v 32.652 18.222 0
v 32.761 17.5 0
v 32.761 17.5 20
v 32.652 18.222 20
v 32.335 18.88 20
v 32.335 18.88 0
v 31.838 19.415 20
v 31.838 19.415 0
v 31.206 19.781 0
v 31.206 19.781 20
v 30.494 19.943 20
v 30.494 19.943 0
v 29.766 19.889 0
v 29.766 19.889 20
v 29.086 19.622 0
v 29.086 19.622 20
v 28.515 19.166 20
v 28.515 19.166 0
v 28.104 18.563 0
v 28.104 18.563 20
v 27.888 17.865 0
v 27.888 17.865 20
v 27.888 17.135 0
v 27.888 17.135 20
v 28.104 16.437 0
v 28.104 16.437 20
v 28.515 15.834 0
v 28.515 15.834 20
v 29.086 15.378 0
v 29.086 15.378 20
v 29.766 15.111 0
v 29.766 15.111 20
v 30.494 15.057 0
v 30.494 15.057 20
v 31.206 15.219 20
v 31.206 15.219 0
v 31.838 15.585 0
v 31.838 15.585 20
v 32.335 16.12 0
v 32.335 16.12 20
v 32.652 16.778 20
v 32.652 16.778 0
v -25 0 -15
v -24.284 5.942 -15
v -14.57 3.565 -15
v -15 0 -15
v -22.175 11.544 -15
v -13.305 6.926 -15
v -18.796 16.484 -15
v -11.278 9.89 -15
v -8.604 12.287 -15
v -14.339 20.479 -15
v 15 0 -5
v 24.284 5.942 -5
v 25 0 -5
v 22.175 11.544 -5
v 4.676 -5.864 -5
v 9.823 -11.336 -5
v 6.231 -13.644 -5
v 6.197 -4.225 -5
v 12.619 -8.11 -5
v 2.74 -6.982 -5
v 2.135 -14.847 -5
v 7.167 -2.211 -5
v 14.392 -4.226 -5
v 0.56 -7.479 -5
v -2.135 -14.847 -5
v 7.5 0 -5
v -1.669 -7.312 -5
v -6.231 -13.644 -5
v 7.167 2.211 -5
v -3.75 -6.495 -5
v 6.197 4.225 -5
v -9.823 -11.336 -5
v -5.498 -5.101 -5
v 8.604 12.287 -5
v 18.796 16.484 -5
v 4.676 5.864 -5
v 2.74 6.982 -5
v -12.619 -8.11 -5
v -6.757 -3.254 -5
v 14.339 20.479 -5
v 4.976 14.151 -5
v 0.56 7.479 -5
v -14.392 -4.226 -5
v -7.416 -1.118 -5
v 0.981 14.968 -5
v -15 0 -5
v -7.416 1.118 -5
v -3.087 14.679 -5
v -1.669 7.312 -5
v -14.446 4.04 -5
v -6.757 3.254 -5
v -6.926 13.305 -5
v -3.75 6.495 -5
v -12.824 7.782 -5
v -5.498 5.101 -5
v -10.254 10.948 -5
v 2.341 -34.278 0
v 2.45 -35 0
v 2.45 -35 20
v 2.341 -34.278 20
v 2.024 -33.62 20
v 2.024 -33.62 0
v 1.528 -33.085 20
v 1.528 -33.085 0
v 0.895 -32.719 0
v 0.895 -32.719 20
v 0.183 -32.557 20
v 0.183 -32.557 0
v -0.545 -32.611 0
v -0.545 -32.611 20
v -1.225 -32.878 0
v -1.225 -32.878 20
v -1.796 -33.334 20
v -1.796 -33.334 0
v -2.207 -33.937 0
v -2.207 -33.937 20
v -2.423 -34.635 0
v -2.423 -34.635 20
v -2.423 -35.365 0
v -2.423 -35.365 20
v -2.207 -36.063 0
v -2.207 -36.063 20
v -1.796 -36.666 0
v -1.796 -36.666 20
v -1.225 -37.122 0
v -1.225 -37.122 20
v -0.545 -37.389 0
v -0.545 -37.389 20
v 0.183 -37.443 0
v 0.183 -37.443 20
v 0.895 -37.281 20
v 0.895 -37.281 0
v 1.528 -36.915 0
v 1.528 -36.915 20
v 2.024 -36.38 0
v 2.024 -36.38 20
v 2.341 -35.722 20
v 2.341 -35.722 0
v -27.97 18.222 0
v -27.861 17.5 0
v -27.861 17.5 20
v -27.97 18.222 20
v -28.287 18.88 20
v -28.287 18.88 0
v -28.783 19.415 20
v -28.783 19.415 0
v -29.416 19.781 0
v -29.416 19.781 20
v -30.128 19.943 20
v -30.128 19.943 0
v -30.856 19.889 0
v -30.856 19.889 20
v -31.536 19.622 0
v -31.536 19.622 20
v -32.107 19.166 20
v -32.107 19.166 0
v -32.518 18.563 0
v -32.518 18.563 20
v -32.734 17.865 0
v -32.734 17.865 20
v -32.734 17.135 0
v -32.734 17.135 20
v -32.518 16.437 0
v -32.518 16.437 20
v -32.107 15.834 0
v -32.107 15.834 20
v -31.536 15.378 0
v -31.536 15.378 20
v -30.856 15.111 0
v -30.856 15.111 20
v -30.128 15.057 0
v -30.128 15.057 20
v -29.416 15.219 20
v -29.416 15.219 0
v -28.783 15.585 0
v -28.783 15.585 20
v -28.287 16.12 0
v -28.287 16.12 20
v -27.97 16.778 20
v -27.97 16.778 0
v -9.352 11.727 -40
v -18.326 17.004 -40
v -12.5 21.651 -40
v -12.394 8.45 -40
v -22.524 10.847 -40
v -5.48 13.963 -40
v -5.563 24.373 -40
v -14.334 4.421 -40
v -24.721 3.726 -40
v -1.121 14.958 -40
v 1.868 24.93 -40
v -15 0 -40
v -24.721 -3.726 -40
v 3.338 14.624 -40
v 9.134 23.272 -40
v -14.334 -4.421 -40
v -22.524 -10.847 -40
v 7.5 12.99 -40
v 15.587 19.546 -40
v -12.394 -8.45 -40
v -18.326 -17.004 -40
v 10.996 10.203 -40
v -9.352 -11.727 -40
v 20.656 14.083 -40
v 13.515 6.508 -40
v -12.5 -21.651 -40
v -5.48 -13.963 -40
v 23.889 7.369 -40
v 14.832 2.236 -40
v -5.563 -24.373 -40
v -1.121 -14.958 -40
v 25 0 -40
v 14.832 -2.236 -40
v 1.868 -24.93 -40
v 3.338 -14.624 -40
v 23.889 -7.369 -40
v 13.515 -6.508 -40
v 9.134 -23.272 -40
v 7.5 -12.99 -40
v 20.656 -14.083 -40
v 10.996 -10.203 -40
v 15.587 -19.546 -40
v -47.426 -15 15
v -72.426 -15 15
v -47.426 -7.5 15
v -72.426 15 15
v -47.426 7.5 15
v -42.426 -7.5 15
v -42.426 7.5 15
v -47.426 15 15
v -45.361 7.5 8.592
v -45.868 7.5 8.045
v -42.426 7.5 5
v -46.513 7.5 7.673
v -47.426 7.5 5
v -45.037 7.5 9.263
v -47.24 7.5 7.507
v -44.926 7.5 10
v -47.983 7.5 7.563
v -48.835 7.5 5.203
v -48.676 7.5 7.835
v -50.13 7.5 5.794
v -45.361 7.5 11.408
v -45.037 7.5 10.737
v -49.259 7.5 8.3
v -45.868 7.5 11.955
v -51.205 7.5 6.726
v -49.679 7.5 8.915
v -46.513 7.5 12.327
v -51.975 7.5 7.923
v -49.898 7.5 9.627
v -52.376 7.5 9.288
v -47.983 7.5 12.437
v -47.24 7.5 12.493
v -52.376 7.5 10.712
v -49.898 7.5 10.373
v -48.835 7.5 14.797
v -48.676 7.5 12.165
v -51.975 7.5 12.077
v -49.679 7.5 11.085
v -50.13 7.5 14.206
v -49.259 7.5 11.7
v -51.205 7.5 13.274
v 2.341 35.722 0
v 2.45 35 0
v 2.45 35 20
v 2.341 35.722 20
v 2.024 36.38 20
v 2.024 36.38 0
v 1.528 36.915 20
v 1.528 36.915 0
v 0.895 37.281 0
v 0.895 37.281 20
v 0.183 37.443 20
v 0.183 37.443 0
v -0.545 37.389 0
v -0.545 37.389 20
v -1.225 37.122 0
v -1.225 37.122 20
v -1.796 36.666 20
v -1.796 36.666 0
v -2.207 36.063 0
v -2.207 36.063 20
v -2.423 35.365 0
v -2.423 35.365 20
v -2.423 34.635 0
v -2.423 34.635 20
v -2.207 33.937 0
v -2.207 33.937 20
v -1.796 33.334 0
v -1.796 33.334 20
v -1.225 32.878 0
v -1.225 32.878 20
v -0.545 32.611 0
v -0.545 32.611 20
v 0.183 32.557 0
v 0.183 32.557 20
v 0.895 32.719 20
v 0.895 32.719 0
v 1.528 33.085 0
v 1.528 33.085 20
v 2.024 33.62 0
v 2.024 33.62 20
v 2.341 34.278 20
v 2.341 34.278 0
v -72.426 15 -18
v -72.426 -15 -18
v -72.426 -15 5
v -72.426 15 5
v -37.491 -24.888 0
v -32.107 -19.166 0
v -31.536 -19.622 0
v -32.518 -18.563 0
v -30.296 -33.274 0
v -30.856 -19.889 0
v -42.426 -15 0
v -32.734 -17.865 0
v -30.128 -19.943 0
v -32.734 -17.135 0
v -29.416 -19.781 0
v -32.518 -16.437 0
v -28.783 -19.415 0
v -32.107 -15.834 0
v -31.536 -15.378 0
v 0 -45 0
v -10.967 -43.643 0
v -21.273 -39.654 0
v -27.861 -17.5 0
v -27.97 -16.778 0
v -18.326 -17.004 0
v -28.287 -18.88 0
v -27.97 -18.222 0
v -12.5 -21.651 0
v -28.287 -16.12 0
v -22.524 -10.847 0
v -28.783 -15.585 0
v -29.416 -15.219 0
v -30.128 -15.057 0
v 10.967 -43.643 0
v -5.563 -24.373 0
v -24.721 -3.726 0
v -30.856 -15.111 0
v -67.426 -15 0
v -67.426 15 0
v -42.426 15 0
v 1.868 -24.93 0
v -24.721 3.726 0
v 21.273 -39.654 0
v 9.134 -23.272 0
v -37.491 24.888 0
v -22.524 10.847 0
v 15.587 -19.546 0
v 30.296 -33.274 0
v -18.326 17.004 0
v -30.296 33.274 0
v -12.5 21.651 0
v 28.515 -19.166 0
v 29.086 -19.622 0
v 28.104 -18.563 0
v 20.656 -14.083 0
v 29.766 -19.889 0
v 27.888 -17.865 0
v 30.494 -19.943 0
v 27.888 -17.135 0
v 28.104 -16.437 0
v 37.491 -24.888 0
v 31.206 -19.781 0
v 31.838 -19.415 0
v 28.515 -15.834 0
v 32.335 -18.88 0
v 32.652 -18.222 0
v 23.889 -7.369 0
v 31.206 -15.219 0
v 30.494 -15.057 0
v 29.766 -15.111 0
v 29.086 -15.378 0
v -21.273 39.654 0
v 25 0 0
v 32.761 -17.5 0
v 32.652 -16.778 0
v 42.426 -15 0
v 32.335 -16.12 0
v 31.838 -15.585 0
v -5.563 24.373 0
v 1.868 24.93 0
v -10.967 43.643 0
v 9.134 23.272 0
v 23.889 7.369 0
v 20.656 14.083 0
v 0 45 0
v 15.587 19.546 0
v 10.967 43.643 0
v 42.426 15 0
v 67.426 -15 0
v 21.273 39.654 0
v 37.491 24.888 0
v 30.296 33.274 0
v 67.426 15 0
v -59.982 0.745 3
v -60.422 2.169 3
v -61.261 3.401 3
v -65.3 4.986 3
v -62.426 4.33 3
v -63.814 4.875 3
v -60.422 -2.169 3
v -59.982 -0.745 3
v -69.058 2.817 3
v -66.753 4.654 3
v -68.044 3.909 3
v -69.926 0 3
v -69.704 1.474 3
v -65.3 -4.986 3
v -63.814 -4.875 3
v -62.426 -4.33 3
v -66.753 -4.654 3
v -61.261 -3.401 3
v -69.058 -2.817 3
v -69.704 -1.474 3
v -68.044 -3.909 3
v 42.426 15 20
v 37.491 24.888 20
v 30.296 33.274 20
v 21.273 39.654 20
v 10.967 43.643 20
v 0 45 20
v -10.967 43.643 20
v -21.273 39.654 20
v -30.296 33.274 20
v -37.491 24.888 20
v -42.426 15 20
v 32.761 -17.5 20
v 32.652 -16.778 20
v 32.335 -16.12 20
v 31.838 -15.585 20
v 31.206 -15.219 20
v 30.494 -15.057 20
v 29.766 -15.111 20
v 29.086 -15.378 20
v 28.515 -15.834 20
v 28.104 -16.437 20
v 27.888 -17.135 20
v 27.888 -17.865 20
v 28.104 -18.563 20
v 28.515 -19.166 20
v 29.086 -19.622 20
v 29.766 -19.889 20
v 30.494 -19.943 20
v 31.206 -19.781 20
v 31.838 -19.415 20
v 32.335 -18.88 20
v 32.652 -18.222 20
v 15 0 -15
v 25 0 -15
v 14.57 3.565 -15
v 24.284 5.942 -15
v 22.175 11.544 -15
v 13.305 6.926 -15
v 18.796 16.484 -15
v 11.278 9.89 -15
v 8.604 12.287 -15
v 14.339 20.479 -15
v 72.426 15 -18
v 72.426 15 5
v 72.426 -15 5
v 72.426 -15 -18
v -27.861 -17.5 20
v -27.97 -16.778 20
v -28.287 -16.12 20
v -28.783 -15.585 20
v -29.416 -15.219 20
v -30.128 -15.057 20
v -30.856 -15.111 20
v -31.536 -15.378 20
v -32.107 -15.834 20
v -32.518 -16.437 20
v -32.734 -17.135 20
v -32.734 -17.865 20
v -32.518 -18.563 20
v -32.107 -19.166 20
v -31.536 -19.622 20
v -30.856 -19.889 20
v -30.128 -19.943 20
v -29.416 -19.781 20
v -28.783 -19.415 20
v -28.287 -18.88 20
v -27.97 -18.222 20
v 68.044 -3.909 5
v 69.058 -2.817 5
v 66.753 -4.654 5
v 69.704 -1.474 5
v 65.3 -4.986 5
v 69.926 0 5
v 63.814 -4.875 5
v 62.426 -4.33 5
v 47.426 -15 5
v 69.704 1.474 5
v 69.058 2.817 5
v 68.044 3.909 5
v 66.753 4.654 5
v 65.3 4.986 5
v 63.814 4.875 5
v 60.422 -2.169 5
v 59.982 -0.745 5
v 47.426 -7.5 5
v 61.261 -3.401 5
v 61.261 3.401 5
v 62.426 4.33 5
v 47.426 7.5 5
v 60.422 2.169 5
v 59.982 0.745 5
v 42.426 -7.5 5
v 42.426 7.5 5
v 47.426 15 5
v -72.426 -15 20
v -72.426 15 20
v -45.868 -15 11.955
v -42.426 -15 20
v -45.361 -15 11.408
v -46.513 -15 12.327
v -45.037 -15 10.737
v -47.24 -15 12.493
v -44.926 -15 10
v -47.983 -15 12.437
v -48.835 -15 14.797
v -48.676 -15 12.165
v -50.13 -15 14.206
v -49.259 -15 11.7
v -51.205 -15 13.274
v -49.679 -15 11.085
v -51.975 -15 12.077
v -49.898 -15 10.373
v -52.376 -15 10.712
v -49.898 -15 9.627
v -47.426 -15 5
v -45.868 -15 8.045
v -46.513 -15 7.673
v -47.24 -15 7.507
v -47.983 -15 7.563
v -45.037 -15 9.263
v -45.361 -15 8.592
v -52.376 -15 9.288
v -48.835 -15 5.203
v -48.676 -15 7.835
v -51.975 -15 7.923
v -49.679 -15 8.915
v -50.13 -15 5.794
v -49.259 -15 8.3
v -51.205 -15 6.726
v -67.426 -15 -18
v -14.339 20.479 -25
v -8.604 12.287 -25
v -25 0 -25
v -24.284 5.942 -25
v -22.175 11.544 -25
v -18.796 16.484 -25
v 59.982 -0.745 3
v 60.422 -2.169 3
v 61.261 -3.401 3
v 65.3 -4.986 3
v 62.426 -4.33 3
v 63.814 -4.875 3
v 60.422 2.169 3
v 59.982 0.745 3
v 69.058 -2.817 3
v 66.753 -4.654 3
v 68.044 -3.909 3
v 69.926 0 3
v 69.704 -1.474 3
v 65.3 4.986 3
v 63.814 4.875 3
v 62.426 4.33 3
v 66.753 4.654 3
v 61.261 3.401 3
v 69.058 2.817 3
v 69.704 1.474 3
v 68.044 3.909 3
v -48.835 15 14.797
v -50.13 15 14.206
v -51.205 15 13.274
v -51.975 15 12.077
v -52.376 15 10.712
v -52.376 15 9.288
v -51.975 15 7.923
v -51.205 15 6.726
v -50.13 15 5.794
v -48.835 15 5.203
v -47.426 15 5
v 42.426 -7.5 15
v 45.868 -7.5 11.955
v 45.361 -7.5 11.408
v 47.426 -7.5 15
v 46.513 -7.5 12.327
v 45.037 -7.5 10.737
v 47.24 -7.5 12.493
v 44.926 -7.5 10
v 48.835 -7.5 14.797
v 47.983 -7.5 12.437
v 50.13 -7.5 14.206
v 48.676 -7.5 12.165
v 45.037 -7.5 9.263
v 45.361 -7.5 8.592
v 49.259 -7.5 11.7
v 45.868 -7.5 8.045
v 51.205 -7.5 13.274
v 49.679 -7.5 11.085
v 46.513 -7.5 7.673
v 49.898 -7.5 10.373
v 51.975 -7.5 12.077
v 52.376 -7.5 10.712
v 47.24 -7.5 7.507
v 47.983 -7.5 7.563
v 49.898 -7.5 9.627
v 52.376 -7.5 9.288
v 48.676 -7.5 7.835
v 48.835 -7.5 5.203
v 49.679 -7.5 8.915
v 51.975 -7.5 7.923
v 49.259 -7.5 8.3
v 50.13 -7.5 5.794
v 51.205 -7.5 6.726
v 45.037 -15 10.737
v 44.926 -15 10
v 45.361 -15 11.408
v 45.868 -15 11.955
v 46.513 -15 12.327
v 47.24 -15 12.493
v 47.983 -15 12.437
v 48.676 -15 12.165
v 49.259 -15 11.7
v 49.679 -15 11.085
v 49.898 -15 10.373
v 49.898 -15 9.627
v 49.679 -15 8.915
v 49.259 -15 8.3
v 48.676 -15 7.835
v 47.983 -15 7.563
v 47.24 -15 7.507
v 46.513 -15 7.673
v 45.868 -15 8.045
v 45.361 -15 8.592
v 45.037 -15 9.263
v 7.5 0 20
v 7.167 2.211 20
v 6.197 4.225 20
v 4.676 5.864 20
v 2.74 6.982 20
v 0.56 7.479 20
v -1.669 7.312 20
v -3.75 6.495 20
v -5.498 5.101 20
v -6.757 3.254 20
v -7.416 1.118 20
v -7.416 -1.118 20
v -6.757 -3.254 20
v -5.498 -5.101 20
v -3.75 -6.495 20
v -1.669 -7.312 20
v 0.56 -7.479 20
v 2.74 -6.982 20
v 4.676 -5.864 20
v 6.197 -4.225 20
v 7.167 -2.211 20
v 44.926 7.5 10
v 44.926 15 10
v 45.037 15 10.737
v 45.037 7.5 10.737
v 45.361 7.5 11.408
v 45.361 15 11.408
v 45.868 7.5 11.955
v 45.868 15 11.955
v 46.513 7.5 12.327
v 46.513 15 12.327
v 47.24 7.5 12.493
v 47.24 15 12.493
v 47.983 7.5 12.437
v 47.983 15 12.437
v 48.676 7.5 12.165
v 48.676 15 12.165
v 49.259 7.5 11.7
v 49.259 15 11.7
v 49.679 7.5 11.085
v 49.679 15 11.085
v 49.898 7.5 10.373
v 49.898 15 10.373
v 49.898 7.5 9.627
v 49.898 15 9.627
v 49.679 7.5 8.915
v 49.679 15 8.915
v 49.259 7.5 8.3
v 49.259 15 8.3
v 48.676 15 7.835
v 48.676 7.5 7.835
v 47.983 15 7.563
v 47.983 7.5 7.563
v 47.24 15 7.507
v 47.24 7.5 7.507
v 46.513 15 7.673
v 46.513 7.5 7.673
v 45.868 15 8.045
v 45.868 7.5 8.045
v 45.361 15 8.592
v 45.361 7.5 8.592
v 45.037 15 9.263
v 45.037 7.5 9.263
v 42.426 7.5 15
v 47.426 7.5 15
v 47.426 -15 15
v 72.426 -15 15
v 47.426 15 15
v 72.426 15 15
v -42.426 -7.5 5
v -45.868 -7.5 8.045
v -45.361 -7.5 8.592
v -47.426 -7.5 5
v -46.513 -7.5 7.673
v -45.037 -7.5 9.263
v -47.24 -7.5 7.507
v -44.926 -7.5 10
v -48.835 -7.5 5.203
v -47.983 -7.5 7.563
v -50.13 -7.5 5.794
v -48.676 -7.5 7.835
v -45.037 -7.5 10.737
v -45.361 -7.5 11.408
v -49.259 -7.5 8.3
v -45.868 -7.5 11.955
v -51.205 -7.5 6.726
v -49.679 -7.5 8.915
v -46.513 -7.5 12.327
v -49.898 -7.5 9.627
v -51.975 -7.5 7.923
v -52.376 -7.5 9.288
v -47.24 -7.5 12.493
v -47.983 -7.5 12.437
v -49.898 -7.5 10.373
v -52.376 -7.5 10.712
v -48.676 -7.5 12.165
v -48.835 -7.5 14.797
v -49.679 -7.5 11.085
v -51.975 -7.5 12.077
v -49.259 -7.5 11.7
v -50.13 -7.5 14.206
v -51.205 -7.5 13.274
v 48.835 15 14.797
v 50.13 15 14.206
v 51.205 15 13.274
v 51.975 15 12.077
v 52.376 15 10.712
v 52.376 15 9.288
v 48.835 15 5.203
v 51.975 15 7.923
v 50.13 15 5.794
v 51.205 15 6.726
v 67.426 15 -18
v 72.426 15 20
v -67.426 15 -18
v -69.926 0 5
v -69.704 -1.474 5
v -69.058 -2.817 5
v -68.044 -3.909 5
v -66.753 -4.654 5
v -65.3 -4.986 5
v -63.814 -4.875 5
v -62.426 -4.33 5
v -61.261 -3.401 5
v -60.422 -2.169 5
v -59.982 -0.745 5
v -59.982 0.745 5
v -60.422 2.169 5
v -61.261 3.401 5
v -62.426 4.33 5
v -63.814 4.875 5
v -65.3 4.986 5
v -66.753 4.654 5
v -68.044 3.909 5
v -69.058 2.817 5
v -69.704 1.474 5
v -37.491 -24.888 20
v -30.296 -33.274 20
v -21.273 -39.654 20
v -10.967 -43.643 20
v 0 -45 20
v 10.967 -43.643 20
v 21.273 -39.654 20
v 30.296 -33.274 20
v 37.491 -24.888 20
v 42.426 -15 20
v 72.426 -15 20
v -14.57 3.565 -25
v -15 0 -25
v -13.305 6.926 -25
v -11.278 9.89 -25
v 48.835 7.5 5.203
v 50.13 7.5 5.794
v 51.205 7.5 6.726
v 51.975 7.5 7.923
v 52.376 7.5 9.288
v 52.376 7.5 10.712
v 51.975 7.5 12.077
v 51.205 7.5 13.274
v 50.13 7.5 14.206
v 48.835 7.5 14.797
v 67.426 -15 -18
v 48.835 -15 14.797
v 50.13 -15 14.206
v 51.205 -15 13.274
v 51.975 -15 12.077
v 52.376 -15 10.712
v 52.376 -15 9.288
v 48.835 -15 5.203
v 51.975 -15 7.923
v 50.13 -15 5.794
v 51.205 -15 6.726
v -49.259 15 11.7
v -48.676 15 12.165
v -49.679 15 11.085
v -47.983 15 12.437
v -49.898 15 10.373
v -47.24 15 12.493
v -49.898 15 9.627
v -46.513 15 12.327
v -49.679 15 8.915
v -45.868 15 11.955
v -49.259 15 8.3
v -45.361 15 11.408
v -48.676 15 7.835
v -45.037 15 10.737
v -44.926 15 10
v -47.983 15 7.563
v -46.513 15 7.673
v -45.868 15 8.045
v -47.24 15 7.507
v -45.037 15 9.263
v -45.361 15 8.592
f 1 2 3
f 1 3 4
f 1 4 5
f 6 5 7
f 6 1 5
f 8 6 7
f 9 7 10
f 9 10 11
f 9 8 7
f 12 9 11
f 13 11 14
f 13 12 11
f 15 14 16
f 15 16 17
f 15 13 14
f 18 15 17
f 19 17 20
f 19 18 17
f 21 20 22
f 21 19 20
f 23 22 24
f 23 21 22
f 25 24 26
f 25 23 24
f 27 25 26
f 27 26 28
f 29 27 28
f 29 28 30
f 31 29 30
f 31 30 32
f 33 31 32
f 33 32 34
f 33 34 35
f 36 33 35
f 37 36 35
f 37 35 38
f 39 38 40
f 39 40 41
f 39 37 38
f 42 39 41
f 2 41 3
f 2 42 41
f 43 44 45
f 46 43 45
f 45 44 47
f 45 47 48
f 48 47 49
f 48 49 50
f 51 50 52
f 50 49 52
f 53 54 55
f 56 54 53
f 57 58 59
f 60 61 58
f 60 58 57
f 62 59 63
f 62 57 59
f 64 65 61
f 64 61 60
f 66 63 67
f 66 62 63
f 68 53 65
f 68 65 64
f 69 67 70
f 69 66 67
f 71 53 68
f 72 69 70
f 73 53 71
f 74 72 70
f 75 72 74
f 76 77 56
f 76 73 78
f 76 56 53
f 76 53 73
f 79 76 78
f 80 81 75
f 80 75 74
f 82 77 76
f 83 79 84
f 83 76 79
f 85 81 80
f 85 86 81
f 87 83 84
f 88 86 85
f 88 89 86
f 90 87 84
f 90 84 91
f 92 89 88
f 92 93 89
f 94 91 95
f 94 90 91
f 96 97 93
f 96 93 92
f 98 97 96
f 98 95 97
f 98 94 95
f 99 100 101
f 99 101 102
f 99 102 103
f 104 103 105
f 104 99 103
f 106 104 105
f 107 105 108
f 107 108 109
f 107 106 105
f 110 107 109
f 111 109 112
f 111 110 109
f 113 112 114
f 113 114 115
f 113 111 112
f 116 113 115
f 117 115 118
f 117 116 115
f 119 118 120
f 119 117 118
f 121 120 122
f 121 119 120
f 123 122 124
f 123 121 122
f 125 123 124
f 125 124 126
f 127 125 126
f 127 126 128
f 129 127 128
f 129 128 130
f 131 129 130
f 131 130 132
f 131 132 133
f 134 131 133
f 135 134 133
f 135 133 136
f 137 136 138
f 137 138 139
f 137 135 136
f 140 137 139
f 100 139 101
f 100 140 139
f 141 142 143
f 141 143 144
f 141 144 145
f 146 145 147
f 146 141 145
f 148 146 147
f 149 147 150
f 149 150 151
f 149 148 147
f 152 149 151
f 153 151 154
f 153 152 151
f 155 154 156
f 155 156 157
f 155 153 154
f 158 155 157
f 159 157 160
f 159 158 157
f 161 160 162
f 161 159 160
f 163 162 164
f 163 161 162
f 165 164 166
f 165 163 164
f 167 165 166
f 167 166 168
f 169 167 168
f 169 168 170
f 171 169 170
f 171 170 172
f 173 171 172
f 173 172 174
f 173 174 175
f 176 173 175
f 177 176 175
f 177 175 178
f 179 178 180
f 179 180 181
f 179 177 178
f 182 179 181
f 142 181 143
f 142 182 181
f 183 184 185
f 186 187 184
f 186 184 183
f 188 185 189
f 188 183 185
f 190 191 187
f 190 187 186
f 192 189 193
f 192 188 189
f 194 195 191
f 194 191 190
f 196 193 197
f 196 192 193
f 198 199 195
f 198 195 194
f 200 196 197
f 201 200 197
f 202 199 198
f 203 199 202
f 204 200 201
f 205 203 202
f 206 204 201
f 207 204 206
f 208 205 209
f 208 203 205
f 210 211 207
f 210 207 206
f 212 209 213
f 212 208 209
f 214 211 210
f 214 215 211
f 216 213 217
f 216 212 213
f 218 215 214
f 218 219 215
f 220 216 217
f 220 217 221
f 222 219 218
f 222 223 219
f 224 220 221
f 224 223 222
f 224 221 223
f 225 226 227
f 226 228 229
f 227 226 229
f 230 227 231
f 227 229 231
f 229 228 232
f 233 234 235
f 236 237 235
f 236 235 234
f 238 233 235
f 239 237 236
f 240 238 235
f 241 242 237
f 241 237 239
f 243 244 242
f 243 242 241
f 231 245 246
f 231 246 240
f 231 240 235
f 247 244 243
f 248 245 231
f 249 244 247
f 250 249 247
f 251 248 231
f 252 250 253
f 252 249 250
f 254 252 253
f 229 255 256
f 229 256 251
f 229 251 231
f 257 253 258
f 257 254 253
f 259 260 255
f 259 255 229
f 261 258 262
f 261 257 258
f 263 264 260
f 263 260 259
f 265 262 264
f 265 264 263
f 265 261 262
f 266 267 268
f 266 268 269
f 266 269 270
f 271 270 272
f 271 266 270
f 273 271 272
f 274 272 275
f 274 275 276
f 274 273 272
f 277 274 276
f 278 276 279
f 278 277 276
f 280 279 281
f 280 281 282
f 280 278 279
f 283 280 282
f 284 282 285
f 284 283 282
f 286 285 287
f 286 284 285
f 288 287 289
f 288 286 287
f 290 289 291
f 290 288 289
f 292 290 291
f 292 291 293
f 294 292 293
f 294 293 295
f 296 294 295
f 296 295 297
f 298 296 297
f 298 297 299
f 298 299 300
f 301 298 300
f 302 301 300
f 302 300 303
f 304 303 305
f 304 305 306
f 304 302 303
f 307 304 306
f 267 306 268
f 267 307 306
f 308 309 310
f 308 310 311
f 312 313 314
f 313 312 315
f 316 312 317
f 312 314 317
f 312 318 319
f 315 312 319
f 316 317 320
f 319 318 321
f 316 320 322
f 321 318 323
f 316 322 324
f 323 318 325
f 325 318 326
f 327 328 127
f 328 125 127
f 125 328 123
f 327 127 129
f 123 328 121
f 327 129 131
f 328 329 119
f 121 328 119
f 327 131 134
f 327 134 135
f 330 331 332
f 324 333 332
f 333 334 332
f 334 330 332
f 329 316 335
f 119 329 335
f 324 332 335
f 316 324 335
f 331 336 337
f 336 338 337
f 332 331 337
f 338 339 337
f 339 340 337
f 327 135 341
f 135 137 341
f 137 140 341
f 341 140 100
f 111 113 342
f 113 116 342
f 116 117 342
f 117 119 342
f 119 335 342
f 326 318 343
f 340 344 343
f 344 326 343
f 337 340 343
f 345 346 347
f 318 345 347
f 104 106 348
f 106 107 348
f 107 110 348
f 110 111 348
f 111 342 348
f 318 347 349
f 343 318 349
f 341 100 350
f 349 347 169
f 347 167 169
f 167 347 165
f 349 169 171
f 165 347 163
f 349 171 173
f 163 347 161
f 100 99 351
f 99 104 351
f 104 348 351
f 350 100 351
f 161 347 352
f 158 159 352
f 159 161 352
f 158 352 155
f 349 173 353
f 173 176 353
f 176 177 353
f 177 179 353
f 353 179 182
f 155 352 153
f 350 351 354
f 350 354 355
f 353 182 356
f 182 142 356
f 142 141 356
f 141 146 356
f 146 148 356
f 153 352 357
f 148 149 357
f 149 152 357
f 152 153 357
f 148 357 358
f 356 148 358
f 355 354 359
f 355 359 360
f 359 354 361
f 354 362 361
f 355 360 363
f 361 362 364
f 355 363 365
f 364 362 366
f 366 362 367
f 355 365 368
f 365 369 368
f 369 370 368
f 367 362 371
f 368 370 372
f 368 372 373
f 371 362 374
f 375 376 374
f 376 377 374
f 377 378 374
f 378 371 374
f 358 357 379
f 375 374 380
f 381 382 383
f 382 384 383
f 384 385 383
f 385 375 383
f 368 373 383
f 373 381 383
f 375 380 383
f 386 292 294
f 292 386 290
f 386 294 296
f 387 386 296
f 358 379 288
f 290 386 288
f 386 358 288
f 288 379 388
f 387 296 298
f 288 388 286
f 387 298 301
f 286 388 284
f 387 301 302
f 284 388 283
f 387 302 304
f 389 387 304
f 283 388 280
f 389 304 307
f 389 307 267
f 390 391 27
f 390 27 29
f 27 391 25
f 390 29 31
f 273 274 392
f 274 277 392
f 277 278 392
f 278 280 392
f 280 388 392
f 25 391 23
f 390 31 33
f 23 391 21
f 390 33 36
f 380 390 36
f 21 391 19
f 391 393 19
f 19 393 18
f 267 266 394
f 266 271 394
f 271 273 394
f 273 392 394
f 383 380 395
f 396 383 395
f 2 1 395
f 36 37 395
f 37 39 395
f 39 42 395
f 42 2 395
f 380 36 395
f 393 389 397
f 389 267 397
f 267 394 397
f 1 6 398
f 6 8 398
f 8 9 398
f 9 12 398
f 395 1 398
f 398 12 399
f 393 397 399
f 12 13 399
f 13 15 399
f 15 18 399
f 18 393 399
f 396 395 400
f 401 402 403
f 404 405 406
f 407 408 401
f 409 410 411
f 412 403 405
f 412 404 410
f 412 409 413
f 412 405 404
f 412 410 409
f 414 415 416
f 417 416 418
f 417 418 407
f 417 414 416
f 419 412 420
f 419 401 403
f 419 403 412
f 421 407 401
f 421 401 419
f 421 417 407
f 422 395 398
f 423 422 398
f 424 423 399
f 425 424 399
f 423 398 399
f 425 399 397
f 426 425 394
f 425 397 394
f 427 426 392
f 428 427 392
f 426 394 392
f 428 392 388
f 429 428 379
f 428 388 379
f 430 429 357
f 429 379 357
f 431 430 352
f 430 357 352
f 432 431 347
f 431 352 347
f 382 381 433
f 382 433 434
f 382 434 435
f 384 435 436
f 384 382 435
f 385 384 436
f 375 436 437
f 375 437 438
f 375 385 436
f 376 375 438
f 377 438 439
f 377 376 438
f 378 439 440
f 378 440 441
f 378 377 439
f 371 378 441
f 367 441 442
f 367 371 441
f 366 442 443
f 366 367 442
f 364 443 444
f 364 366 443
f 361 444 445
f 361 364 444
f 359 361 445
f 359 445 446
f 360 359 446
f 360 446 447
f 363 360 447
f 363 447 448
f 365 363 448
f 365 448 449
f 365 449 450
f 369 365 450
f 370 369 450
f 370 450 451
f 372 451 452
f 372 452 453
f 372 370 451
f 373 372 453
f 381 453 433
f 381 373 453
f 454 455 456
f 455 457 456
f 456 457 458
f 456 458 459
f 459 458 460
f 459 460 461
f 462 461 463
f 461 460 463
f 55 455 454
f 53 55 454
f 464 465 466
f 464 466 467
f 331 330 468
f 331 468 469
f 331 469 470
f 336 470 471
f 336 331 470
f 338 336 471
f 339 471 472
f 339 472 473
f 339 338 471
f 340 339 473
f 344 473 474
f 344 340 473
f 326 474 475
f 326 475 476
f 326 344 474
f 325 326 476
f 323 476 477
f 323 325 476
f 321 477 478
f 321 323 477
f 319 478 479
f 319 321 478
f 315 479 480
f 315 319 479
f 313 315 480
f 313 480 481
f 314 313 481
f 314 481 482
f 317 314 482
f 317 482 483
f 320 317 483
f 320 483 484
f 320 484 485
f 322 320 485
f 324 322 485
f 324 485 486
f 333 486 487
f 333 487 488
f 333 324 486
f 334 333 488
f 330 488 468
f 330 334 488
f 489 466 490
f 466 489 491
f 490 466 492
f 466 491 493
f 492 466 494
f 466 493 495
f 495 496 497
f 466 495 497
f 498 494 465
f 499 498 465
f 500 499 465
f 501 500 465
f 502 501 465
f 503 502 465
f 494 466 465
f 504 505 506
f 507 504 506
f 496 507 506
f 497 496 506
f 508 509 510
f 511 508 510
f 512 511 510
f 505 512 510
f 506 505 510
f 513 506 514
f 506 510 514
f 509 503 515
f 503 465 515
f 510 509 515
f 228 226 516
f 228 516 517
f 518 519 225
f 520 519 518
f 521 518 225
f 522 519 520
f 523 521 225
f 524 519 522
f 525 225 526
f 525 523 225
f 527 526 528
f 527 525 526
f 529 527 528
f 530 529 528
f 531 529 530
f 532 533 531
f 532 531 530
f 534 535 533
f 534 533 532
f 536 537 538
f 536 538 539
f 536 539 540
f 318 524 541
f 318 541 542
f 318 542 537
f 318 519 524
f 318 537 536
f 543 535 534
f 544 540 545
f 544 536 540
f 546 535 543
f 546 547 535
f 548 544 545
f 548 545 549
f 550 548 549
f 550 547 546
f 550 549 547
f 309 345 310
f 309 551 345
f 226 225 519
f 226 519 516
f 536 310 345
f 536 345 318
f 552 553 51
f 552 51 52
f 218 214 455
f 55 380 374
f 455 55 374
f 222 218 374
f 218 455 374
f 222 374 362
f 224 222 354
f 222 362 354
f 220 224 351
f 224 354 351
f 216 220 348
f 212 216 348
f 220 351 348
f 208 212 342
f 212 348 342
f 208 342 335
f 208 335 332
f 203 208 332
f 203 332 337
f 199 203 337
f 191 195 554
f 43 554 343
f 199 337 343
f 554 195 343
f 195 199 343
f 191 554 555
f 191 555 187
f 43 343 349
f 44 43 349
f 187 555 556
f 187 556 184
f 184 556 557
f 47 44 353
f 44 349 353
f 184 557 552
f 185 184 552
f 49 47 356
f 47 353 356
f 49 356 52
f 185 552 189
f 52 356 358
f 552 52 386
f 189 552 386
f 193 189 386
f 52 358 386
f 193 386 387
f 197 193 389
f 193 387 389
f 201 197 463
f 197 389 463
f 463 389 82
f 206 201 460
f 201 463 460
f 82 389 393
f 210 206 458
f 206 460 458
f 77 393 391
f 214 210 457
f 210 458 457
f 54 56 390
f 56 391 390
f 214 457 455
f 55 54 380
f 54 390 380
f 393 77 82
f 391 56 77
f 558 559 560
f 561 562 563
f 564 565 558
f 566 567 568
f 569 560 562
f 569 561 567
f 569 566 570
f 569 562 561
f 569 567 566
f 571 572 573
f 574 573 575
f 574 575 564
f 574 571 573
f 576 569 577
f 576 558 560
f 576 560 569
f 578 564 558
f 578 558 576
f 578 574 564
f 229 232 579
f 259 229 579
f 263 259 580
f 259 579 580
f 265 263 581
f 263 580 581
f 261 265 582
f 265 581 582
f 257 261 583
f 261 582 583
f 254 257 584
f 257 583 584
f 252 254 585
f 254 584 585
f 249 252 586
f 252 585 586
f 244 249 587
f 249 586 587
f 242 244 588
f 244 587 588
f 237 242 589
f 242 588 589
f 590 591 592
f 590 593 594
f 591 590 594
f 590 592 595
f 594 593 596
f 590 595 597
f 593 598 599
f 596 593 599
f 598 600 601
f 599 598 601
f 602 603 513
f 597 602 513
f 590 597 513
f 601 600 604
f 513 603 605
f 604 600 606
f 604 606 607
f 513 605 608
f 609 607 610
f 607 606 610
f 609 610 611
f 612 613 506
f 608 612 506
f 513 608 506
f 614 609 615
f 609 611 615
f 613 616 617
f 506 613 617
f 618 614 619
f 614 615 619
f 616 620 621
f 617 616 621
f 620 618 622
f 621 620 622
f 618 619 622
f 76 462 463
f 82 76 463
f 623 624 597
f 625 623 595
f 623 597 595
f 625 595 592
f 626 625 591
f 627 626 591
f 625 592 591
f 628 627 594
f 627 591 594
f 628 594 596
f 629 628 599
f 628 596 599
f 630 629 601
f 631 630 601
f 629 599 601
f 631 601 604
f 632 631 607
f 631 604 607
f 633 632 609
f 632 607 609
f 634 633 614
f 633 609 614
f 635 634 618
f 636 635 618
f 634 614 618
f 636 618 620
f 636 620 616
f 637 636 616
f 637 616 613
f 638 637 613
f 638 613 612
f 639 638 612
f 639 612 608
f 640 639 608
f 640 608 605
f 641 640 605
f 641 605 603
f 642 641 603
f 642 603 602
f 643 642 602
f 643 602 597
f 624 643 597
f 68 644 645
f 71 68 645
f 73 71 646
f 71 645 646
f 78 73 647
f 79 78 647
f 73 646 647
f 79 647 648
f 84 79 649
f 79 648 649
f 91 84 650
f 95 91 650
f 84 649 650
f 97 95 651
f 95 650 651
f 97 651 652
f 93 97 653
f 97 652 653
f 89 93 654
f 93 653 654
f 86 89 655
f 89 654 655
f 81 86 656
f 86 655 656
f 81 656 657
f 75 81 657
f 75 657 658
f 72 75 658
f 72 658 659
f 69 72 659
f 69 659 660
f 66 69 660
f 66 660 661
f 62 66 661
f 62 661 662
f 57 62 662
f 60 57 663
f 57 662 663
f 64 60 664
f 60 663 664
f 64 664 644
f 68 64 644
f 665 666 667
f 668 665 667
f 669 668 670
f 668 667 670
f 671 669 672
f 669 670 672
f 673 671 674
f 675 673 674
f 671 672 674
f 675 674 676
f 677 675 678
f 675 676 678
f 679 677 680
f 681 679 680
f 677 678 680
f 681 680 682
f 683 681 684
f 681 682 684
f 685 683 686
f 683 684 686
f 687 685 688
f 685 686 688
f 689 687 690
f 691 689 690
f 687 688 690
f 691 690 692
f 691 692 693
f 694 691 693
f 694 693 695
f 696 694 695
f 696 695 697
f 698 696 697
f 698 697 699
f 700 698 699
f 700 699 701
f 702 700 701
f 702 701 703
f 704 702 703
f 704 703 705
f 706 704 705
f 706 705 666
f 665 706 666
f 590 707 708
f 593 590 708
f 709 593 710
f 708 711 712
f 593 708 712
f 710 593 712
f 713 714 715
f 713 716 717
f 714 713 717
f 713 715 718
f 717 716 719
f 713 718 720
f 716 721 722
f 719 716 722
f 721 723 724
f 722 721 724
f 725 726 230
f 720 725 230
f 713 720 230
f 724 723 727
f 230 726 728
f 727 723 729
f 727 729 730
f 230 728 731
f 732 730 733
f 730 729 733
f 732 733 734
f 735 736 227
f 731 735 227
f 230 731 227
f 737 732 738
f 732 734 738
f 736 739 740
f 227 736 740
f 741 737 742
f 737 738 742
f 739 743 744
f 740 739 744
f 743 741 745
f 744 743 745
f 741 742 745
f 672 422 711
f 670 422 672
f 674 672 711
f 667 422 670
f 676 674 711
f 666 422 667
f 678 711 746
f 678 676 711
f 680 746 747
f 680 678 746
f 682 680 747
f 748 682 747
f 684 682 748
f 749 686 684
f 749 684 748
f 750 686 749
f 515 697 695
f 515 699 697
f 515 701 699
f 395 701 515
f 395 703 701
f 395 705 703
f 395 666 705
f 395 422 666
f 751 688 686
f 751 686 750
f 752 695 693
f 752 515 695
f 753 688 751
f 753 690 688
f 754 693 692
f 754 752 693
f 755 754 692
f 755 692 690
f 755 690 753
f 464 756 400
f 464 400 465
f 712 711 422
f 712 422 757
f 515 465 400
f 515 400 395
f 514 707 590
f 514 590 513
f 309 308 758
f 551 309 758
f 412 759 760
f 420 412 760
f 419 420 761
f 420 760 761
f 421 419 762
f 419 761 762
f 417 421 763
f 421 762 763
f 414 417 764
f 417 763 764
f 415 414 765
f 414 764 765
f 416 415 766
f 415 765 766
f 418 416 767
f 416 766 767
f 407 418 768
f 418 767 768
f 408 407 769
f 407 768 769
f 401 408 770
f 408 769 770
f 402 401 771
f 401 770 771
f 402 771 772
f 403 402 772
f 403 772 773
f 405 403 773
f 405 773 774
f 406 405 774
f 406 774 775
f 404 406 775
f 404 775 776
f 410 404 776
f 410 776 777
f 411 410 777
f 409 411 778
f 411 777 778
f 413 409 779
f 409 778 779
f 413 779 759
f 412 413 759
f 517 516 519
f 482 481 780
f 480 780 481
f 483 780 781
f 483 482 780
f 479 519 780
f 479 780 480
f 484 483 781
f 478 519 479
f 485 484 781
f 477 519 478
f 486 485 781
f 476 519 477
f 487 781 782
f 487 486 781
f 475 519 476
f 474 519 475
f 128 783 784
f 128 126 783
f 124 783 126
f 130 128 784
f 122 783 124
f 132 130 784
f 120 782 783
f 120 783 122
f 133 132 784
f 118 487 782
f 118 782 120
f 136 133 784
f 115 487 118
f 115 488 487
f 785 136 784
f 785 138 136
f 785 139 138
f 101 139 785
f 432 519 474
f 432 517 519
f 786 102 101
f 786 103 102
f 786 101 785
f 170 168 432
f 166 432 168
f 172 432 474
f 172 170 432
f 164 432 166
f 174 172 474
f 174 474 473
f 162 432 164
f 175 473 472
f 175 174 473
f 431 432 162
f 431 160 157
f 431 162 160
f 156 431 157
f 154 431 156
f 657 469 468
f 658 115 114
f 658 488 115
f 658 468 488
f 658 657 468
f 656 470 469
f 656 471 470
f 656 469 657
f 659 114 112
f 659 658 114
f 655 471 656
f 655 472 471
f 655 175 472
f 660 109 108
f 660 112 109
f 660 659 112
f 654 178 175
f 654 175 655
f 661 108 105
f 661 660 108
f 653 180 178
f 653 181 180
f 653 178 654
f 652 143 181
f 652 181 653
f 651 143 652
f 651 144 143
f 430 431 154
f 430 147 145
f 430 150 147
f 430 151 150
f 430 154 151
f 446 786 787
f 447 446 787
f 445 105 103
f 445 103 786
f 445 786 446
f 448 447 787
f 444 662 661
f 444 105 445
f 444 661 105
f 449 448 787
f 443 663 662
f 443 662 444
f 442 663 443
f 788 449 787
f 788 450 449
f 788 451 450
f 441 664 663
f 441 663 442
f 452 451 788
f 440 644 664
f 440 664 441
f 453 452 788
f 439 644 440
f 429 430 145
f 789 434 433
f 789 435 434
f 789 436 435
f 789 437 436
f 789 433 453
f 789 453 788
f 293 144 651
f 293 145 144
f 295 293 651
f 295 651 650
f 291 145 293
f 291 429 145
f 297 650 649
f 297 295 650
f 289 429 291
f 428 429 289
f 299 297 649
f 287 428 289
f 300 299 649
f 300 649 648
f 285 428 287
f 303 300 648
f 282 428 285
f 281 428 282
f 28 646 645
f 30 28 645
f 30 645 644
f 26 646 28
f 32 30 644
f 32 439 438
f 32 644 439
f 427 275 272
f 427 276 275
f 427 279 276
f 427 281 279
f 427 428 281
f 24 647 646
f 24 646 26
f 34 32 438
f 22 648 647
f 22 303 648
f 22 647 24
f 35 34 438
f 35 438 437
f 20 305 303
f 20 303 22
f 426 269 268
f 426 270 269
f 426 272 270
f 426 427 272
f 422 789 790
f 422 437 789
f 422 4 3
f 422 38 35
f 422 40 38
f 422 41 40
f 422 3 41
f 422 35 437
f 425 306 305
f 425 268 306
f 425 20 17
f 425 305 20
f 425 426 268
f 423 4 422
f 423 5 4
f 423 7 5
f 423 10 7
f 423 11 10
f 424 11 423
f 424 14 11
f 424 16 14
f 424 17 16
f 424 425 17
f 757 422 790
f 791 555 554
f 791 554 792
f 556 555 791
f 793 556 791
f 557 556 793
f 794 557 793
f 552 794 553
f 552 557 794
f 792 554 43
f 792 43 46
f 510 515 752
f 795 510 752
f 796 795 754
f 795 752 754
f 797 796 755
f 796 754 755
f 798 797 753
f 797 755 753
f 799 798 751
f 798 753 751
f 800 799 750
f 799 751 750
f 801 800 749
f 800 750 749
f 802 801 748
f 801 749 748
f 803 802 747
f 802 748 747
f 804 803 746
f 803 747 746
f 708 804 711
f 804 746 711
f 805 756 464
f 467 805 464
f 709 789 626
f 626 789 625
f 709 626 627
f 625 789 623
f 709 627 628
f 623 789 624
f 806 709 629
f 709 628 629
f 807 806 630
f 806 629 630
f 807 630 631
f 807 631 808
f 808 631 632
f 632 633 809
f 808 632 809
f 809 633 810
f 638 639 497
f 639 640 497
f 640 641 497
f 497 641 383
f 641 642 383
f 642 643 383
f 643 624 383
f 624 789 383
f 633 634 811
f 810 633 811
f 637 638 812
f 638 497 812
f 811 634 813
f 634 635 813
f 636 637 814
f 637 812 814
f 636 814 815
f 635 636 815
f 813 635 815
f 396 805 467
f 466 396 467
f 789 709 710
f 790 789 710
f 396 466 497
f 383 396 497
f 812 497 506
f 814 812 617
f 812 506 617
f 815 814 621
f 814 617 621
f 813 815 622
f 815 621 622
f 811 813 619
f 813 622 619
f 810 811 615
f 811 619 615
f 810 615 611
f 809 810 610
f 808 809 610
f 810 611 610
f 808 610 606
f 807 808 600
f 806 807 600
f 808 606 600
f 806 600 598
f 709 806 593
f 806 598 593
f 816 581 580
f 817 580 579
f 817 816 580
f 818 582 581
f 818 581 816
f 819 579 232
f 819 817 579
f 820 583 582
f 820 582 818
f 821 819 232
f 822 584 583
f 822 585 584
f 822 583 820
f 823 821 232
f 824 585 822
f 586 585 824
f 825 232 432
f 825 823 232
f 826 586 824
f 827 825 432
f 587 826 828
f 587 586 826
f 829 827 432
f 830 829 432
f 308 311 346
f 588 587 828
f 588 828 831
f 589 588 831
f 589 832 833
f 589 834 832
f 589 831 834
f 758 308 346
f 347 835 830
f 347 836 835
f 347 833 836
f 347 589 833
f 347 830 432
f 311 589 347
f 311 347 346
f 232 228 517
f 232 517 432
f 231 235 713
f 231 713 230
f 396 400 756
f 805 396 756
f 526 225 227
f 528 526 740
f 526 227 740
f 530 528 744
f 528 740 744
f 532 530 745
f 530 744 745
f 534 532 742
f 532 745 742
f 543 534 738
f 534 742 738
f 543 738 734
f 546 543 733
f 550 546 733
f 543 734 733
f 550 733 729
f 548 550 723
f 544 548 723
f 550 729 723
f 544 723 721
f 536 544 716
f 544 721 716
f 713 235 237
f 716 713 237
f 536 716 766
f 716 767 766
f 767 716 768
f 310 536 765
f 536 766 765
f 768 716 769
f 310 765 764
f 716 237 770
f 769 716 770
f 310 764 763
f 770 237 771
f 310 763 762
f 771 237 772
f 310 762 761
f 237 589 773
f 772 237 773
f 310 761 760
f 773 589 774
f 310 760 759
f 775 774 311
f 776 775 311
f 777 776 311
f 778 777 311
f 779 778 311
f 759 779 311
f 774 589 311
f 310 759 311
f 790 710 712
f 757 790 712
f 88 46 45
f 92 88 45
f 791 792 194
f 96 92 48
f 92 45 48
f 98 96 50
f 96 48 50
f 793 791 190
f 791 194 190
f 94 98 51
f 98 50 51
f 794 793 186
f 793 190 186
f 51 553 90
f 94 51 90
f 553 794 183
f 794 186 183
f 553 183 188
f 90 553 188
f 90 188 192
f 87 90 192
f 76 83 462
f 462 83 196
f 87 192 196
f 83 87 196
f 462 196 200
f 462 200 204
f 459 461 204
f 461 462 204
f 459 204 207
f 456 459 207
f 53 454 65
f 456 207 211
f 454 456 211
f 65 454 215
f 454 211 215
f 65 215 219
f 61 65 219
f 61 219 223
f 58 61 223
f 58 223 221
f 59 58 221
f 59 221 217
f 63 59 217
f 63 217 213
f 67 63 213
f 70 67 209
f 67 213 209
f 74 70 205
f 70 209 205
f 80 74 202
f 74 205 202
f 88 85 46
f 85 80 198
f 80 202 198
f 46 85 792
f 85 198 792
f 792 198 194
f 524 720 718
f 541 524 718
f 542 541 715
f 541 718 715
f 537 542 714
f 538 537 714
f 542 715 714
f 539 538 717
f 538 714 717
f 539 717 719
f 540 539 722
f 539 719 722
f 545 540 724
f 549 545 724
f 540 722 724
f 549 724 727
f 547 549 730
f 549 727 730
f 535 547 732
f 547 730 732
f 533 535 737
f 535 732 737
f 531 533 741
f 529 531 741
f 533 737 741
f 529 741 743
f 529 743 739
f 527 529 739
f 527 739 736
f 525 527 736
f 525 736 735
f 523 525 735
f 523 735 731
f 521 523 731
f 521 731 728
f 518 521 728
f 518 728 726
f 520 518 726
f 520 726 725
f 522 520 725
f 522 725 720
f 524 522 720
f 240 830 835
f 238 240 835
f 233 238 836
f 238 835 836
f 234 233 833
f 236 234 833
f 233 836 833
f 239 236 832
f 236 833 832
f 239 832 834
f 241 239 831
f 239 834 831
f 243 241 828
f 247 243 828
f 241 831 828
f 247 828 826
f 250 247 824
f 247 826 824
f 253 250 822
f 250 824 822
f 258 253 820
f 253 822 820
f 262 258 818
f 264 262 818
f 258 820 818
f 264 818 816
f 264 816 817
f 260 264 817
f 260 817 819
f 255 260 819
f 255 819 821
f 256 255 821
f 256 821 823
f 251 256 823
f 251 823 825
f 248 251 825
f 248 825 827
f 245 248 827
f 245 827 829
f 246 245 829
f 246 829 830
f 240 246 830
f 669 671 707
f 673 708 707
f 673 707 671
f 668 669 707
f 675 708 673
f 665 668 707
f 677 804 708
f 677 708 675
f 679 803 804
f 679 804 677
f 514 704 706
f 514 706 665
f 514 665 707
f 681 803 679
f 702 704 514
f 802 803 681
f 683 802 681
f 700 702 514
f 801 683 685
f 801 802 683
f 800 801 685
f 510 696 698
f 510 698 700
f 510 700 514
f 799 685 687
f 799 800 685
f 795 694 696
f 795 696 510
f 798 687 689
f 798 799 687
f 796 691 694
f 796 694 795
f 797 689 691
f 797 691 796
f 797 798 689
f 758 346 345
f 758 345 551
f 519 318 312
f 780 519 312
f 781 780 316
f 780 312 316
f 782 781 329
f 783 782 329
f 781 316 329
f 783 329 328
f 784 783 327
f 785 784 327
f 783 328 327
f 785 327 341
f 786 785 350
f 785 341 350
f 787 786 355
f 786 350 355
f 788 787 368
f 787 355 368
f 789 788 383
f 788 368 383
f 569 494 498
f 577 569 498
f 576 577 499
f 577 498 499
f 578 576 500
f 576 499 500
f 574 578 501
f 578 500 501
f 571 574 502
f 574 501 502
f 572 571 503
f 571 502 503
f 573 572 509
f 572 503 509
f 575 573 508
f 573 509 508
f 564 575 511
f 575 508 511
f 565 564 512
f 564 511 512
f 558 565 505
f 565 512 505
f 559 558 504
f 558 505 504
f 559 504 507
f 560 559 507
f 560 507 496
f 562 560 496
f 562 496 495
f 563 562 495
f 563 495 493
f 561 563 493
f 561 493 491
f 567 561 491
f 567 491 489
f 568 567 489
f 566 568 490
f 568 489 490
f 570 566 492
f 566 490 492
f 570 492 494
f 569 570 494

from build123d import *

# Parameters (mm, degrees)
IZIM1_R                     = 45
IZIM1_R_2                   = 2.45
Y_KSEKLIK_EKSTR_ZYON1_DEPTH = 20
IZIM2_R                     = 25
Y_KSEKLIK_EKSTR_ZYON2_DEPTH = 40
Y_KSEKLIK_EKSTR_ZYON3_START = -20
Y_KSEKLIK_EKSTR_ZYON3_DEPTH = 20
IZIM4_R                     = 2.5
KES_EKSTR_ZYON1_DEPTH       = 30
IZIM5_W                     = 10
IZIM5_H                     = 15
KES_EKSTR_ZYON3_DEPTH       = 30
IZIM8_R                     = 5
KES_EKSTR_ZYON4_DEPTH       = 2
IZIM10_R                    = 7.5
KES_EKSTR_ZYON5_DEPTH       = 25
IZIM12_W                    = 5
IZIM12_H                    = 18
Y_KSEKLIK_EKSTR_ZYON4_DEPTH = 30
IZIM14_W                    = 10
IZIM14_H                    = 15
KES_EKSTR_ZYON6_DEPTH       = 30
IZIM16_R                    = 15
KES_EKSTR_ZYON8_DEPTH       = 35
KES_EKSTR_ZYON9_START       = -25
KES_EKSTR_ZYON9_DEPTH       = 10
KES_EKSTR_ZYON10_START      = -15
KES_EKSTR_ZYON10_DEPTH      = 10


with BuildPart() as part:
    # Çizim1 → Yükseklik-Ekstrüzyon1 (new body)
    with BuildSketch(Plane.XY):
        Circle(IZIM1_R)
        with Locations((0, 35)):
            Circle(IZIM1_R_2, mode=Mode.SUBTRACT)
        with Locations((30.310889132, 17.5)):
            Circle(IZIM1_R_2, mode=Mode.SUBTRACT)
        with Locations((30.310889132, -17.5)):
            Circle(IZIM1_R_2, mode=Mode.SUBTRACT)
        with Locations((0, -35)):
            Circle(IZIM1_R_2, mode=Mode.SUBTRACT)
        with Locations((-30.310889132, -17.5)):
            Circle(IZIM1_R_2, mode=Mode.SUBTRACT)
        with Locations((-30.310889132, 17.5)):
            Circle(IZIM1_R_2, mode=Mode.SUBTRACT)
    extrude(amount=Y_KSEKLIK_EKSTR_ZYON1_DEPTH)

    # Çizim2 → Yükseklik-Ekstrüzyon2 (add)
    with BuildSketch(Plane(origin=(0, 0, 0), x_dir=(-1, 0, 0), z_dir=(0, 0, -1))):
        with Locations(Location((0, 0, 0), (0, 0, 180))):
            Circle(IZIM2_R)
    extrude(amount=Y_KSEKLIK_EKSTR_ZYON2_DEPTH)

    # Çizim3 → Yükseklik-Ekstrüzyon3 (add)
    with BuildSketch(Plane.XY.offset(20).offset(Y_KSEKLIK_EKSTR_ZYON3_START)):
        with BuildLine():
            Line((42.426406871, -15), (72.426406871, -15))
            Line((72.426406871, -15), (72.426406871, 15))
            Line((72.426406871, 15), (42.426406871, 15))
            ThreePointArc((42.426406871, 15), (45, 0), (42.426406871, -15))
        make_face()
        with BuildLine():
            Line((-42.426406871, -15), (-72.426406871, -15))
            Line((-72.426406871, -15), (-72.426406871, 15))
            Line((-72.426406871, 15), (-42.426406871, 15))
            ThreePointArc((-42.426406871, 15), (-45, 0), (-42.426406871, -15))
        make_face()
    extrude(amount=Y_KSEKLIK_EKSTR_ZYON3_DEPTH)

    # Çizim4 → Kes-Ekstrüzyon1 (cut)
    with BuildSketch(Plane(origin=(0, 15, 0), x_dir=(1, 0, 0), z_dir=(0, 1, 0))):
        with Locations(Location((47.426406871, -10, 0), (0, 0, 180))):
            Circle(IZIM4_R)
        with Locations((-47.426406871, -10)):
            Circle(IZIM4_R)
        with BuildLine():
            Line((72.426406871, -5), (47.426406871, -5))
            ThreePointArc((47.426406871, -5), (52.426406871, -10), (47.426406871, -15))
            Line((47.426406871, -15), (72.426406871, -15))
            Line((72.426406871, -15), (72.426406871, -5))
        make_face()
        with BuildLine():
            Line((-72.426406871, -15), (-47.426406871, -15))
            ThreePointArc((-47.426406871, -15), (-52.426406871, -10), (-47.426406871, -5))
            Line((-47.426406871, -5), (-72.426406871, -5))
            Line((-72.426406871, -5), (-72.426406871, -15))
        make_face()
    extrude(amount=-KES_EKSTR_ZYON1_DEPTH, mode=Mode.SUBTRACT)

    # Çizim5 → Kes-Ekstrüzyon3 (cut)
    with BuildSketch(Plane(origin=(72.426406871, 0, 0), x_dir=(0, 0, -1), z_dir=(1, 0, 0))):
        with Locations((-10, 0)):
            Rectangle(IZIM5_W, IZIM5_H)
    extrude(amount=-KES_EKSTR_ZYON3_DEPTH, mode=Mode.SUBTRACT)

    # Çizim8 → Kes-Ekstrüzyon4 (cut)
    with BuildSketch(Plane.XY.offset(5)):
        with Locations((64.926406871, 0)):
            Circle(IZIM8_R)
        with Locations(Location((-64.926406871, 0, 0), (0, 0, 180))):
            Circle(IZIM8_R)
    extrude(amount=-KES_EKSTR_ZYON4_DEPTH, mode=Mode.SUBTRACT)

    # Çizim10 → Kes-Ekstrüzyon5 (cut)
    with BuildSketch(Plane.XY.offset(20)):
        Circle(IZIM10_R)
    extrude(amount=-KES_EKSTR_ZYON5_DEPTH, mode=Mode.SUBTRACT)

    # Çizim12 → Yükseklik-Ekstrüzyon4 (add)
    with BuildSketch(Plane(origin=(0, 15, 0), x_dir=(1, 0, 0), z_dir=(0, 1, 0))):
        with Locations((69.926406871, 9)):
            Rectangle(IZIM12_W, IZIM12_H)
        with Locations((-69.926406871, 9)):
            Rectangle(IZIM12_W, IZIM12_H)
    extrude(amount=-Y_KSEKLIK_EKSTR_ZYON4_DEPTH)

    # Çizim14 → Kes-Ekstrüzyon6 (cut)
    with BuildSketch(Plane.ZY.offset(72.426406871)):
        with Locations((10, 0)):
            Rectangle(IZIM14_W, IZIM14_H)
    extrude(amount=-KES_EKSTR_ZYON6_DEPTH, mode=Mode.SUBTRACT)

    # Çizim16 → Kes-Ekstrüzyon8 (cut)
    with BuildSketch(Plane(origin=(0, 0, -40), x_dir=(-1, 0, 0), z_dir=(0, 0, -1))):
        Circle(IZIM16_R)
    extrude(amount=-KES_EKSTR_ZYON8_DEPTH, mode=Mode.SUBTRACT)

    # Çizim17 → Kes-Ekstrüzyon9 (cut)
    with BuildSketch(Plane(origin=(0, 0, -40), x_dir=(-1, 0, 0), z_dir=(0, 0, -1)).offset(KES_EKSTR_ZYON9_START)):
        with BuildLine():
            Line((-25, 0), (-15, 0))
            ThreePointArc((-15, 0), (-13.305162498, 6.926229199), (-8.603646545, 12.287280664))
            Line((-8.603646545, 12.287280664), (-14.339410909, 20.478801107))
            ThreePointArc((-14.339410909, 20.478801107), (-22.175270829, 11.543715331), (-25, 0))
        make_face()
    extrude(amount=-KES_EKSTR_ZYON9_DEPTH, mode=Mode.SUBTRACT)

    # Çizim18 → Kes-Ekstrüzyon10 (cut)
    with BuildSketch(Plane(origin=(0, 0, -40), x_dir=(-1, 0, 0), z_dir=(0, 0, -1)).offset(KES_EKSTR_ZYON10_START)):
        with BuildLine():
            Line((8.603646545, 12.287280664), (14.339410909, 20.478801107))
            ThreePointArc((14.339410909, 20.478801107), (22.175270829, 11.543715331), (25, 0))
            Line((25, 0), (15, 0))
            ThreePointArc((15, 0), (13.305162498, 6.926229199), (8.603646545, 12.287280664))
        make_face()
    extrude(amount=-KES_EKSTR_ZYON10_DEPTH, mode=Mode.SUBTRACT)


solid = part.part
